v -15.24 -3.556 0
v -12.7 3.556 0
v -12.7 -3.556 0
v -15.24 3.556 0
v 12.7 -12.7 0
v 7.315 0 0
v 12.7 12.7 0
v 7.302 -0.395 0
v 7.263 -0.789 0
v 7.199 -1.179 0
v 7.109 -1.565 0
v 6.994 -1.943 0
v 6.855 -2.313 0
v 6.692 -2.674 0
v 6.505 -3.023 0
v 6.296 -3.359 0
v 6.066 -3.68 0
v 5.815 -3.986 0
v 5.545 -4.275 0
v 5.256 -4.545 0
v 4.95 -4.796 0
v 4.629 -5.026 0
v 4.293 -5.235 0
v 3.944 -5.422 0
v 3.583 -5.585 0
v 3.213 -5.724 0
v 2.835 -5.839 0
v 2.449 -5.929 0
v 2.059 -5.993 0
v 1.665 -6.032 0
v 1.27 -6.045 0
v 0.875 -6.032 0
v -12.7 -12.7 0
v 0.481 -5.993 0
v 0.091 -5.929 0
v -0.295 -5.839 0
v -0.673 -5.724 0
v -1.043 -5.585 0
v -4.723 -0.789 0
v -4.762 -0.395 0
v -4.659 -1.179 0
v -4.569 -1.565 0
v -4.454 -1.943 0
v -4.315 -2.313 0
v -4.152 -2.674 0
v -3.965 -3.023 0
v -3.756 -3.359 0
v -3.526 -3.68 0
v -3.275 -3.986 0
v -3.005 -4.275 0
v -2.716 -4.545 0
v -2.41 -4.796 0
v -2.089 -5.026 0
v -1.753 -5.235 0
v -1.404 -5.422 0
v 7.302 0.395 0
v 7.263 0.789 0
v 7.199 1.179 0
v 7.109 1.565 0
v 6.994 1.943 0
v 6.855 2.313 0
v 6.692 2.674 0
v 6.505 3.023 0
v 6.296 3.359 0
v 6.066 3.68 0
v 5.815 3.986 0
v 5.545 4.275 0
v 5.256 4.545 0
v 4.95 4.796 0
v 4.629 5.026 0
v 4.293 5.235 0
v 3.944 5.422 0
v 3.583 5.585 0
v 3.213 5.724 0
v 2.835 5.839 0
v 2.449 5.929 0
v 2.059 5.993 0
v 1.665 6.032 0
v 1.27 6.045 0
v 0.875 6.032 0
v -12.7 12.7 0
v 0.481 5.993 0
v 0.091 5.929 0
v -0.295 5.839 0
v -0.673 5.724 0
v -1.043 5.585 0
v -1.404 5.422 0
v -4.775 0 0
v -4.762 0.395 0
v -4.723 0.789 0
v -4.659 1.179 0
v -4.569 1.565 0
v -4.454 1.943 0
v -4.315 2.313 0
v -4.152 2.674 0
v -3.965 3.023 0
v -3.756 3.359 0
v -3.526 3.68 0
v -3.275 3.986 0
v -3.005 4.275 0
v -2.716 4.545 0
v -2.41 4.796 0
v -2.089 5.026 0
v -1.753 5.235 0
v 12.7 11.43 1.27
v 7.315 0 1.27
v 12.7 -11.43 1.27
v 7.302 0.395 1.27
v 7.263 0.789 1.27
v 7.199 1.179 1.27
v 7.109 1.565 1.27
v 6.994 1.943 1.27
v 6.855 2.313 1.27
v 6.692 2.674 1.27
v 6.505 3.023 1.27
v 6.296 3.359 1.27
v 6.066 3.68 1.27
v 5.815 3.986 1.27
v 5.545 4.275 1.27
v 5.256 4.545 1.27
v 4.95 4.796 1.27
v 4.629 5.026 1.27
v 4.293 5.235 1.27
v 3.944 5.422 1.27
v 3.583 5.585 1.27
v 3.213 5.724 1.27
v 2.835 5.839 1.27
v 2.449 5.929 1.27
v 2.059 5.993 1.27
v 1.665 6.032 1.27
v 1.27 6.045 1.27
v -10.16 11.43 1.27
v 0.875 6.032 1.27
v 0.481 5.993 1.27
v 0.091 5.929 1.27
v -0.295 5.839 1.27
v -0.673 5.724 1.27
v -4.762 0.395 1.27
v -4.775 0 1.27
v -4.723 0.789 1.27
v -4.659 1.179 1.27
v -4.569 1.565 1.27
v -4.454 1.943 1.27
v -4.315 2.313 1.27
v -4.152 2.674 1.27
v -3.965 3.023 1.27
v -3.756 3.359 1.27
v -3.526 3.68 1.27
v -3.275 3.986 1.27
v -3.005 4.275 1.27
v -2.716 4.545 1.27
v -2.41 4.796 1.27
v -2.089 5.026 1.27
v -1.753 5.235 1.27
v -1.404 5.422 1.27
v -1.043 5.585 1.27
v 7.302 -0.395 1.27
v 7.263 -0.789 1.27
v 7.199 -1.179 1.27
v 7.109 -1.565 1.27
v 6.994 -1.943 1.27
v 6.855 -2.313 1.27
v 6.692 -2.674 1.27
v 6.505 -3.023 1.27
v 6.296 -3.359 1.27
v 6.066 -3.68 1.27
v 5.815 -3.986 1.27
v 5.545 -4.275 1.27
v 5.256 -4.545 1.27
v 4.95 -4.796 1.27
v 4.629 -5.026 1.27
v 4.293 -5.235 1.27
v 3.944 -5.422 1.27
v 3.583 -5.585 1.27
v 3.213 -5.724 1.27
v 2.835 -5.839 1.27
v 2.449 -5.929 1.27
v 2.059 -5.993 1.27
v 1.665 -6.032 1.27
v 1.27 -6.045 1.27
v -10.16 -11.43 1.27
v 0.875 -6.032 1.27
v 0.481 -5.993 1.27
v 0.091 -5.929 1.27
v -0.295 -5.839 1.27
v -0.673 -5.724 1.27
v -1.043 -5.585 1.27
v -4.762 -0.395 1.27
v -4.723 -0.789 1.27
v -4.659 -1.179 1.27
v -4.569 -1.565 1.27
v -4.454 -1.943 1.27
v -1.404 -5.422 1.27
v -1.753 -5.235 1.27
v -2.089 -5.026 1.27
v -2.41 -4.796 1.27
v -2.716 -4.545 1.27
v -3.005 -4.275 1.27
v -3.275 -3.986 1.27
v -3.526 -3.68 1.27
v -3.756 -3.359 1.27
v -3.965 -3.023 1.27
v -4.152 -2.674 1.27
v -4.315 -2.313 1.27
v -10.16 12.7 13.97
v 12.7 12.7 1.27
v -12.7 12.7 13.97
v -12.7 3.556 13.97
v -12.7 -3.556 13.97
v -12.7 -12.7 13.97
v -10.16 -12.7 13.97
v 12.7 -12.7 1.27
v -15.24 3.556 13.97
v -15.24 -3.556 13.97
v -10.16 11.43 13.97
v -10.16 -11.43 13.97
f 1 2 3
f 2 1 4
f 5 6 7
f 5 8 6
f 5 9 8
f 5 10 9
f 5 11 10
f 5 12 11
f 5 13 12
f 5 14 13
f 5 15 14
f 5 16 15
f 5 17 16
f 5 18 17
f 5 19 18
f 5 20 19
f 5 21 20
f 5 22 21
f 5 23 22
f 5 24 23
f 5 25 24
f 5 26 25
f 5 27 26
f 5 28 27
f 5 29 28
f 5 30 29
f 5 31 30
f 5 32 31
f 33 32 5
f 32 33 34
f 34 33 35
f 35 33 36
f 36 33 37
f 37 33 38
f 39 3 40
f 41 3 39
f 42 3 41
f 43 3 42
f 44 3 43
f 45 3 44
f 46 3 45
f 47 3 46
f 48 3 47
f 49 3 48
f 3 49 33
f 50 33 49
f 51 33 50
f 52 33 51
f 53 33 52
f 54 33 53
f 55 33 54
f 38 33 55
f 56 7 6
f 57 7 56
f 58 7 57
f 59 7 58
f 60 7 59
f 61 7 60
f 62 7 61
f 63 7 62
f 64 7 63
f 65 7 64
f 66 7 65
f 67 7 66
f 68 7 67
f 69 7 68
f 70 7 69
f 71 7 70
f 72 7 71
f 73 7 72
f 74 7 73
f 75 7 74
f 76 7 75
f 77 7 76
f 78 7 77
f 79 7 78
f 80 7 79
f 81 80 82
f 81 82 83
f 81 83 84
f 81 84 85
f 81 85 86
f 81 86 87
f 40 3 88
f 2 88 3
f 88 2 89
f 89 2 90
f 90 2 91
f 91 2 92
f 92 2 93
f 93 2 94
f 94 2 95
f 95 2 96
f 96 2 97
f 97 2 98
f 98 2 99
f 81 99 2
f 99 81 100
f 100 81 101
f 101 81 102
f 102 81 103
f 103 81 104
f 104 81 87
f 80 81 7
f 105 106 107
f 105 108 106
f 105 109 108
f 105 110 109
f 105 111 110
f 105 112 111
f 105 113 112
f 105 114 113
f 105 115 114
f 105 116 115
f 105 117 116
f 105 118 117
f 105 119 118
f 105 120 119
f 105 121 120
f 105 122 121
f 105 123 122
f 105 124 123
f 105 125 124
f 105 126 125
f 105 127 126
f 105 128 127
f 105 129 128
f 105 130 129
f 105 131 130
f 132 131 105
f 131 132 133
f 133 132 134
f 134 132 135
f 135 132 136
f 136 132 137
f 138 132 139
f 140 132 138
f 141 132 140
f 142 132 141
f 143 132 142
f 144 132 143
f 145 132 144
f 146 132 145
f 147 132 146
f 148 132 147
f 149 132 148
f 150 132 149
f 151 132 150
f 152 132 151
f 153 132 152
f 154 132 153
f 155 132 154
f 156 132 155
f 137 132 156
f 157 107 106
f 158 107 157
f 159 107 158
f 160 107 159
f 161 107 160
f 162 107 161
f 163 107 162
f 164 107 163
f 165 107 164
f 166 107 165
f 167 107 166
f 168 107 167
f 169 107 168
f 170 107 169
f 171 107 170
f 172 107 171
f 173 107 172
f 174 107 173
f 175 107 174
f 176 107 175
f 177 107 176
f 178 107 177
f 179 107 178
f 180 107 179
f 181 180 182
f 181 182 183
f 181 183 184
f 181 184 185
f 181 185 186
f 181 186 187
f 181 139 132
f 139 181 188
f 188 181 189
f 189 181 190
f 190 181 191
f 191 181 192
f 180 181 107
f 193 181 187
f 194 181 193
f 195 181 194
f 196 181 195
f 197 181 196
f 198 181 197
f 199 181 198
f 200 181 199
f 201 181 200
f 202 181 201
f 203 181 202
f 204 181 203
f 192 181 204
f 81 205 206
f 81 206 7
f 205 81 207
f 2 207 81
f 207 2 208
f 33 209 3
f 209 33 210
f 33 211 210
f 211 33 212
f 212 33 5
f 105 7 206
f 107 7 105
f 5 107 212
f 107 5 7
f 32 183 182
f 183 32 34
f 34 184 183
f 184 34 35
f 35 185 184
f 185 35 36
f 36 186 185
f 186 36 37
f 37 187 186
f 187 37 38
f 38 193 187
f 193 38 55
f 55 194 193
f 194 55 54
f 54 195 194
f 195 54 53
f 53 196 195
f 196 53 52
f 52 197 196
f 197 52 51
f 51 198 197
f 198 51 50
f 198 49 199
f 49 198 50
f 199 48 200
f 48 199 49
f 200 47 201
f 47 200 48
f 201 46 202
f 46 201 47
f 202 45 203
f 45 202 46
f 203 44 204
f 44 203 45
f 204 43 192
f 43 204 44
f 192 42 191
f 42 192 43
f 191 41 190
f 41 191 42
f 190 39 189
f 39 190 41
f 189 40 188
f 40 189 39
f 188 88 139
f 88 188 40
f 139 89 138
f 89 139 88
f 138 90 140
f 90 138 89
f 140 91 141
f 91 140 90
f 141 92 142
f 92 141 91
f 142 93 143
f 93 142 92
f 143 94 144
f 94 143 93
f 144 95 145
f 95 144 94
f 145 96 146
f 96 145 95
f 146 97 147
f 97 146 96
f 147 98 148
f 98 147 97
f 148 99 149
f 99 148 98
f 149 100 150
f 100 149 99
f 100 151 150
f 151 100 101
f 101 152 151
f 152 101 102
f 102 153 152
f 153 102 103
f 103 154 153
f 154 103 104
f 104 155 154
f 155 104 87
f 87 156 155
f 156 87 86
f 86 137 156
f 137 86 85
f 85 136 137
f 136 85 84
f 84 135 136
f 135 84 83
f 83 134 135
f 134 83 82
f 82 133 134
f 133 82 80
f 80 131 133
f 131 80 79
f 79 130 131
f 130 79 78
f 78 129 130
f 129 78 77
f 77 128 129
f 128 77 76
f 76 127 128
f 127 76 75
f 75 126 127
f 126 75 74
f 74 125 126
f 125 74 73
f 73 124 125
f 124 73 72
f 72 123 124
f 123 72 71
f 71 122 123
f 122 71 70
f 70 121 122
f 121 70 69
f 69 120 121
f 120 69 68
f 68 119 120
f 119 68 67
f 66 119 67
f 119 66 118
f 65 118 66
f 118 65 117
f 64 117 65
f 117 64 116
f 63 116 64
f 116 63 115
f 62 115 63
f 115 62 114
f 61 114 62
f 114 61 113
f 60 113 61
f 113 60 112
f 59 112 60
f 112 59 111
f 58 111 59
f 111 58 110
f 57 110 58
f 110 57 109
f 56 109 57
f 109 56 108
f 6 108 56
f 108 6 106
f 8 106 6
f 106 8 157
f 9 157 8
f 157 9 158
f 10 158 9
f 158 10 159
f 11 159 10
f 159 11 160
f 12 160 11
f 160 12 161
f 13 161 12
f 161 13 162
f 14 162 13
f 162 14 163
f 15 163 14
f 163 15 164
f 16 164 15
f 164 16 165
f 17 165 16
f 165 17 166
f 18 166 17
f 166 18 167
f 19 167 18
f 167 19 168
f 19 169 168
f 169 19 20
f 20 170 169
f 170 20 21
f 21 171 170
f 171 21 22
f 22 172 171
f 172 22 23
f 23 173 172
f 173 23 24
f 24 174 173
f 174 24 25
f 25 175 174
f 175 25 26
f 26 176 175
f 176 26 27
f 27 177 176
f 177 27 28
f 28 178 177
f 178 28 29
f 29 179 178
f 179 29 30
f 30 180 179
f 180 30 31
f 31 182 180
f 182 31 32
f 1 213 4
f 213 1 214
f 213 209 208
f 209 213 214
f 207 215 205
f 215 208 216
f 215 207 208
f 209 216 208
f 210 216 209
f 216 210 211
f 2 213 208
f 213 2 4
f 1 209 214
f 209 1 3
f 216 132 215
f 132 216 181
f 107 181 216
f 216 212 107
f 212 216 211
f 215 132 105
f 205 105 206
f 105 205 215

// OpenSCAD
ViewScale = [0.0254, 0.0254, 0.0254];

module brace()
{
    rotate([90, 0, 0])
    linear_extrude(50)
    polygon(points = [[0, 0], [900, 0], [0, 500]]);
}

scale(ViewScale)
{
    linear_extrude(50)
    difference() {
        square([1000, 1000], center = true);
        translate([50, 0, 0]) circle(238, $fn=96);
    }
    // spine
    translate([-550, 0, 0]) linear_extrude(550) square([100, 280], center=true); 
    // side
    translate([-450, 0, 50]) linear_extrude(500) square([100, 1000], center=true);
    // braces
    translate([-400, -450, 50]) brace();
    translate([-400, 500, 50]) brace();
}
